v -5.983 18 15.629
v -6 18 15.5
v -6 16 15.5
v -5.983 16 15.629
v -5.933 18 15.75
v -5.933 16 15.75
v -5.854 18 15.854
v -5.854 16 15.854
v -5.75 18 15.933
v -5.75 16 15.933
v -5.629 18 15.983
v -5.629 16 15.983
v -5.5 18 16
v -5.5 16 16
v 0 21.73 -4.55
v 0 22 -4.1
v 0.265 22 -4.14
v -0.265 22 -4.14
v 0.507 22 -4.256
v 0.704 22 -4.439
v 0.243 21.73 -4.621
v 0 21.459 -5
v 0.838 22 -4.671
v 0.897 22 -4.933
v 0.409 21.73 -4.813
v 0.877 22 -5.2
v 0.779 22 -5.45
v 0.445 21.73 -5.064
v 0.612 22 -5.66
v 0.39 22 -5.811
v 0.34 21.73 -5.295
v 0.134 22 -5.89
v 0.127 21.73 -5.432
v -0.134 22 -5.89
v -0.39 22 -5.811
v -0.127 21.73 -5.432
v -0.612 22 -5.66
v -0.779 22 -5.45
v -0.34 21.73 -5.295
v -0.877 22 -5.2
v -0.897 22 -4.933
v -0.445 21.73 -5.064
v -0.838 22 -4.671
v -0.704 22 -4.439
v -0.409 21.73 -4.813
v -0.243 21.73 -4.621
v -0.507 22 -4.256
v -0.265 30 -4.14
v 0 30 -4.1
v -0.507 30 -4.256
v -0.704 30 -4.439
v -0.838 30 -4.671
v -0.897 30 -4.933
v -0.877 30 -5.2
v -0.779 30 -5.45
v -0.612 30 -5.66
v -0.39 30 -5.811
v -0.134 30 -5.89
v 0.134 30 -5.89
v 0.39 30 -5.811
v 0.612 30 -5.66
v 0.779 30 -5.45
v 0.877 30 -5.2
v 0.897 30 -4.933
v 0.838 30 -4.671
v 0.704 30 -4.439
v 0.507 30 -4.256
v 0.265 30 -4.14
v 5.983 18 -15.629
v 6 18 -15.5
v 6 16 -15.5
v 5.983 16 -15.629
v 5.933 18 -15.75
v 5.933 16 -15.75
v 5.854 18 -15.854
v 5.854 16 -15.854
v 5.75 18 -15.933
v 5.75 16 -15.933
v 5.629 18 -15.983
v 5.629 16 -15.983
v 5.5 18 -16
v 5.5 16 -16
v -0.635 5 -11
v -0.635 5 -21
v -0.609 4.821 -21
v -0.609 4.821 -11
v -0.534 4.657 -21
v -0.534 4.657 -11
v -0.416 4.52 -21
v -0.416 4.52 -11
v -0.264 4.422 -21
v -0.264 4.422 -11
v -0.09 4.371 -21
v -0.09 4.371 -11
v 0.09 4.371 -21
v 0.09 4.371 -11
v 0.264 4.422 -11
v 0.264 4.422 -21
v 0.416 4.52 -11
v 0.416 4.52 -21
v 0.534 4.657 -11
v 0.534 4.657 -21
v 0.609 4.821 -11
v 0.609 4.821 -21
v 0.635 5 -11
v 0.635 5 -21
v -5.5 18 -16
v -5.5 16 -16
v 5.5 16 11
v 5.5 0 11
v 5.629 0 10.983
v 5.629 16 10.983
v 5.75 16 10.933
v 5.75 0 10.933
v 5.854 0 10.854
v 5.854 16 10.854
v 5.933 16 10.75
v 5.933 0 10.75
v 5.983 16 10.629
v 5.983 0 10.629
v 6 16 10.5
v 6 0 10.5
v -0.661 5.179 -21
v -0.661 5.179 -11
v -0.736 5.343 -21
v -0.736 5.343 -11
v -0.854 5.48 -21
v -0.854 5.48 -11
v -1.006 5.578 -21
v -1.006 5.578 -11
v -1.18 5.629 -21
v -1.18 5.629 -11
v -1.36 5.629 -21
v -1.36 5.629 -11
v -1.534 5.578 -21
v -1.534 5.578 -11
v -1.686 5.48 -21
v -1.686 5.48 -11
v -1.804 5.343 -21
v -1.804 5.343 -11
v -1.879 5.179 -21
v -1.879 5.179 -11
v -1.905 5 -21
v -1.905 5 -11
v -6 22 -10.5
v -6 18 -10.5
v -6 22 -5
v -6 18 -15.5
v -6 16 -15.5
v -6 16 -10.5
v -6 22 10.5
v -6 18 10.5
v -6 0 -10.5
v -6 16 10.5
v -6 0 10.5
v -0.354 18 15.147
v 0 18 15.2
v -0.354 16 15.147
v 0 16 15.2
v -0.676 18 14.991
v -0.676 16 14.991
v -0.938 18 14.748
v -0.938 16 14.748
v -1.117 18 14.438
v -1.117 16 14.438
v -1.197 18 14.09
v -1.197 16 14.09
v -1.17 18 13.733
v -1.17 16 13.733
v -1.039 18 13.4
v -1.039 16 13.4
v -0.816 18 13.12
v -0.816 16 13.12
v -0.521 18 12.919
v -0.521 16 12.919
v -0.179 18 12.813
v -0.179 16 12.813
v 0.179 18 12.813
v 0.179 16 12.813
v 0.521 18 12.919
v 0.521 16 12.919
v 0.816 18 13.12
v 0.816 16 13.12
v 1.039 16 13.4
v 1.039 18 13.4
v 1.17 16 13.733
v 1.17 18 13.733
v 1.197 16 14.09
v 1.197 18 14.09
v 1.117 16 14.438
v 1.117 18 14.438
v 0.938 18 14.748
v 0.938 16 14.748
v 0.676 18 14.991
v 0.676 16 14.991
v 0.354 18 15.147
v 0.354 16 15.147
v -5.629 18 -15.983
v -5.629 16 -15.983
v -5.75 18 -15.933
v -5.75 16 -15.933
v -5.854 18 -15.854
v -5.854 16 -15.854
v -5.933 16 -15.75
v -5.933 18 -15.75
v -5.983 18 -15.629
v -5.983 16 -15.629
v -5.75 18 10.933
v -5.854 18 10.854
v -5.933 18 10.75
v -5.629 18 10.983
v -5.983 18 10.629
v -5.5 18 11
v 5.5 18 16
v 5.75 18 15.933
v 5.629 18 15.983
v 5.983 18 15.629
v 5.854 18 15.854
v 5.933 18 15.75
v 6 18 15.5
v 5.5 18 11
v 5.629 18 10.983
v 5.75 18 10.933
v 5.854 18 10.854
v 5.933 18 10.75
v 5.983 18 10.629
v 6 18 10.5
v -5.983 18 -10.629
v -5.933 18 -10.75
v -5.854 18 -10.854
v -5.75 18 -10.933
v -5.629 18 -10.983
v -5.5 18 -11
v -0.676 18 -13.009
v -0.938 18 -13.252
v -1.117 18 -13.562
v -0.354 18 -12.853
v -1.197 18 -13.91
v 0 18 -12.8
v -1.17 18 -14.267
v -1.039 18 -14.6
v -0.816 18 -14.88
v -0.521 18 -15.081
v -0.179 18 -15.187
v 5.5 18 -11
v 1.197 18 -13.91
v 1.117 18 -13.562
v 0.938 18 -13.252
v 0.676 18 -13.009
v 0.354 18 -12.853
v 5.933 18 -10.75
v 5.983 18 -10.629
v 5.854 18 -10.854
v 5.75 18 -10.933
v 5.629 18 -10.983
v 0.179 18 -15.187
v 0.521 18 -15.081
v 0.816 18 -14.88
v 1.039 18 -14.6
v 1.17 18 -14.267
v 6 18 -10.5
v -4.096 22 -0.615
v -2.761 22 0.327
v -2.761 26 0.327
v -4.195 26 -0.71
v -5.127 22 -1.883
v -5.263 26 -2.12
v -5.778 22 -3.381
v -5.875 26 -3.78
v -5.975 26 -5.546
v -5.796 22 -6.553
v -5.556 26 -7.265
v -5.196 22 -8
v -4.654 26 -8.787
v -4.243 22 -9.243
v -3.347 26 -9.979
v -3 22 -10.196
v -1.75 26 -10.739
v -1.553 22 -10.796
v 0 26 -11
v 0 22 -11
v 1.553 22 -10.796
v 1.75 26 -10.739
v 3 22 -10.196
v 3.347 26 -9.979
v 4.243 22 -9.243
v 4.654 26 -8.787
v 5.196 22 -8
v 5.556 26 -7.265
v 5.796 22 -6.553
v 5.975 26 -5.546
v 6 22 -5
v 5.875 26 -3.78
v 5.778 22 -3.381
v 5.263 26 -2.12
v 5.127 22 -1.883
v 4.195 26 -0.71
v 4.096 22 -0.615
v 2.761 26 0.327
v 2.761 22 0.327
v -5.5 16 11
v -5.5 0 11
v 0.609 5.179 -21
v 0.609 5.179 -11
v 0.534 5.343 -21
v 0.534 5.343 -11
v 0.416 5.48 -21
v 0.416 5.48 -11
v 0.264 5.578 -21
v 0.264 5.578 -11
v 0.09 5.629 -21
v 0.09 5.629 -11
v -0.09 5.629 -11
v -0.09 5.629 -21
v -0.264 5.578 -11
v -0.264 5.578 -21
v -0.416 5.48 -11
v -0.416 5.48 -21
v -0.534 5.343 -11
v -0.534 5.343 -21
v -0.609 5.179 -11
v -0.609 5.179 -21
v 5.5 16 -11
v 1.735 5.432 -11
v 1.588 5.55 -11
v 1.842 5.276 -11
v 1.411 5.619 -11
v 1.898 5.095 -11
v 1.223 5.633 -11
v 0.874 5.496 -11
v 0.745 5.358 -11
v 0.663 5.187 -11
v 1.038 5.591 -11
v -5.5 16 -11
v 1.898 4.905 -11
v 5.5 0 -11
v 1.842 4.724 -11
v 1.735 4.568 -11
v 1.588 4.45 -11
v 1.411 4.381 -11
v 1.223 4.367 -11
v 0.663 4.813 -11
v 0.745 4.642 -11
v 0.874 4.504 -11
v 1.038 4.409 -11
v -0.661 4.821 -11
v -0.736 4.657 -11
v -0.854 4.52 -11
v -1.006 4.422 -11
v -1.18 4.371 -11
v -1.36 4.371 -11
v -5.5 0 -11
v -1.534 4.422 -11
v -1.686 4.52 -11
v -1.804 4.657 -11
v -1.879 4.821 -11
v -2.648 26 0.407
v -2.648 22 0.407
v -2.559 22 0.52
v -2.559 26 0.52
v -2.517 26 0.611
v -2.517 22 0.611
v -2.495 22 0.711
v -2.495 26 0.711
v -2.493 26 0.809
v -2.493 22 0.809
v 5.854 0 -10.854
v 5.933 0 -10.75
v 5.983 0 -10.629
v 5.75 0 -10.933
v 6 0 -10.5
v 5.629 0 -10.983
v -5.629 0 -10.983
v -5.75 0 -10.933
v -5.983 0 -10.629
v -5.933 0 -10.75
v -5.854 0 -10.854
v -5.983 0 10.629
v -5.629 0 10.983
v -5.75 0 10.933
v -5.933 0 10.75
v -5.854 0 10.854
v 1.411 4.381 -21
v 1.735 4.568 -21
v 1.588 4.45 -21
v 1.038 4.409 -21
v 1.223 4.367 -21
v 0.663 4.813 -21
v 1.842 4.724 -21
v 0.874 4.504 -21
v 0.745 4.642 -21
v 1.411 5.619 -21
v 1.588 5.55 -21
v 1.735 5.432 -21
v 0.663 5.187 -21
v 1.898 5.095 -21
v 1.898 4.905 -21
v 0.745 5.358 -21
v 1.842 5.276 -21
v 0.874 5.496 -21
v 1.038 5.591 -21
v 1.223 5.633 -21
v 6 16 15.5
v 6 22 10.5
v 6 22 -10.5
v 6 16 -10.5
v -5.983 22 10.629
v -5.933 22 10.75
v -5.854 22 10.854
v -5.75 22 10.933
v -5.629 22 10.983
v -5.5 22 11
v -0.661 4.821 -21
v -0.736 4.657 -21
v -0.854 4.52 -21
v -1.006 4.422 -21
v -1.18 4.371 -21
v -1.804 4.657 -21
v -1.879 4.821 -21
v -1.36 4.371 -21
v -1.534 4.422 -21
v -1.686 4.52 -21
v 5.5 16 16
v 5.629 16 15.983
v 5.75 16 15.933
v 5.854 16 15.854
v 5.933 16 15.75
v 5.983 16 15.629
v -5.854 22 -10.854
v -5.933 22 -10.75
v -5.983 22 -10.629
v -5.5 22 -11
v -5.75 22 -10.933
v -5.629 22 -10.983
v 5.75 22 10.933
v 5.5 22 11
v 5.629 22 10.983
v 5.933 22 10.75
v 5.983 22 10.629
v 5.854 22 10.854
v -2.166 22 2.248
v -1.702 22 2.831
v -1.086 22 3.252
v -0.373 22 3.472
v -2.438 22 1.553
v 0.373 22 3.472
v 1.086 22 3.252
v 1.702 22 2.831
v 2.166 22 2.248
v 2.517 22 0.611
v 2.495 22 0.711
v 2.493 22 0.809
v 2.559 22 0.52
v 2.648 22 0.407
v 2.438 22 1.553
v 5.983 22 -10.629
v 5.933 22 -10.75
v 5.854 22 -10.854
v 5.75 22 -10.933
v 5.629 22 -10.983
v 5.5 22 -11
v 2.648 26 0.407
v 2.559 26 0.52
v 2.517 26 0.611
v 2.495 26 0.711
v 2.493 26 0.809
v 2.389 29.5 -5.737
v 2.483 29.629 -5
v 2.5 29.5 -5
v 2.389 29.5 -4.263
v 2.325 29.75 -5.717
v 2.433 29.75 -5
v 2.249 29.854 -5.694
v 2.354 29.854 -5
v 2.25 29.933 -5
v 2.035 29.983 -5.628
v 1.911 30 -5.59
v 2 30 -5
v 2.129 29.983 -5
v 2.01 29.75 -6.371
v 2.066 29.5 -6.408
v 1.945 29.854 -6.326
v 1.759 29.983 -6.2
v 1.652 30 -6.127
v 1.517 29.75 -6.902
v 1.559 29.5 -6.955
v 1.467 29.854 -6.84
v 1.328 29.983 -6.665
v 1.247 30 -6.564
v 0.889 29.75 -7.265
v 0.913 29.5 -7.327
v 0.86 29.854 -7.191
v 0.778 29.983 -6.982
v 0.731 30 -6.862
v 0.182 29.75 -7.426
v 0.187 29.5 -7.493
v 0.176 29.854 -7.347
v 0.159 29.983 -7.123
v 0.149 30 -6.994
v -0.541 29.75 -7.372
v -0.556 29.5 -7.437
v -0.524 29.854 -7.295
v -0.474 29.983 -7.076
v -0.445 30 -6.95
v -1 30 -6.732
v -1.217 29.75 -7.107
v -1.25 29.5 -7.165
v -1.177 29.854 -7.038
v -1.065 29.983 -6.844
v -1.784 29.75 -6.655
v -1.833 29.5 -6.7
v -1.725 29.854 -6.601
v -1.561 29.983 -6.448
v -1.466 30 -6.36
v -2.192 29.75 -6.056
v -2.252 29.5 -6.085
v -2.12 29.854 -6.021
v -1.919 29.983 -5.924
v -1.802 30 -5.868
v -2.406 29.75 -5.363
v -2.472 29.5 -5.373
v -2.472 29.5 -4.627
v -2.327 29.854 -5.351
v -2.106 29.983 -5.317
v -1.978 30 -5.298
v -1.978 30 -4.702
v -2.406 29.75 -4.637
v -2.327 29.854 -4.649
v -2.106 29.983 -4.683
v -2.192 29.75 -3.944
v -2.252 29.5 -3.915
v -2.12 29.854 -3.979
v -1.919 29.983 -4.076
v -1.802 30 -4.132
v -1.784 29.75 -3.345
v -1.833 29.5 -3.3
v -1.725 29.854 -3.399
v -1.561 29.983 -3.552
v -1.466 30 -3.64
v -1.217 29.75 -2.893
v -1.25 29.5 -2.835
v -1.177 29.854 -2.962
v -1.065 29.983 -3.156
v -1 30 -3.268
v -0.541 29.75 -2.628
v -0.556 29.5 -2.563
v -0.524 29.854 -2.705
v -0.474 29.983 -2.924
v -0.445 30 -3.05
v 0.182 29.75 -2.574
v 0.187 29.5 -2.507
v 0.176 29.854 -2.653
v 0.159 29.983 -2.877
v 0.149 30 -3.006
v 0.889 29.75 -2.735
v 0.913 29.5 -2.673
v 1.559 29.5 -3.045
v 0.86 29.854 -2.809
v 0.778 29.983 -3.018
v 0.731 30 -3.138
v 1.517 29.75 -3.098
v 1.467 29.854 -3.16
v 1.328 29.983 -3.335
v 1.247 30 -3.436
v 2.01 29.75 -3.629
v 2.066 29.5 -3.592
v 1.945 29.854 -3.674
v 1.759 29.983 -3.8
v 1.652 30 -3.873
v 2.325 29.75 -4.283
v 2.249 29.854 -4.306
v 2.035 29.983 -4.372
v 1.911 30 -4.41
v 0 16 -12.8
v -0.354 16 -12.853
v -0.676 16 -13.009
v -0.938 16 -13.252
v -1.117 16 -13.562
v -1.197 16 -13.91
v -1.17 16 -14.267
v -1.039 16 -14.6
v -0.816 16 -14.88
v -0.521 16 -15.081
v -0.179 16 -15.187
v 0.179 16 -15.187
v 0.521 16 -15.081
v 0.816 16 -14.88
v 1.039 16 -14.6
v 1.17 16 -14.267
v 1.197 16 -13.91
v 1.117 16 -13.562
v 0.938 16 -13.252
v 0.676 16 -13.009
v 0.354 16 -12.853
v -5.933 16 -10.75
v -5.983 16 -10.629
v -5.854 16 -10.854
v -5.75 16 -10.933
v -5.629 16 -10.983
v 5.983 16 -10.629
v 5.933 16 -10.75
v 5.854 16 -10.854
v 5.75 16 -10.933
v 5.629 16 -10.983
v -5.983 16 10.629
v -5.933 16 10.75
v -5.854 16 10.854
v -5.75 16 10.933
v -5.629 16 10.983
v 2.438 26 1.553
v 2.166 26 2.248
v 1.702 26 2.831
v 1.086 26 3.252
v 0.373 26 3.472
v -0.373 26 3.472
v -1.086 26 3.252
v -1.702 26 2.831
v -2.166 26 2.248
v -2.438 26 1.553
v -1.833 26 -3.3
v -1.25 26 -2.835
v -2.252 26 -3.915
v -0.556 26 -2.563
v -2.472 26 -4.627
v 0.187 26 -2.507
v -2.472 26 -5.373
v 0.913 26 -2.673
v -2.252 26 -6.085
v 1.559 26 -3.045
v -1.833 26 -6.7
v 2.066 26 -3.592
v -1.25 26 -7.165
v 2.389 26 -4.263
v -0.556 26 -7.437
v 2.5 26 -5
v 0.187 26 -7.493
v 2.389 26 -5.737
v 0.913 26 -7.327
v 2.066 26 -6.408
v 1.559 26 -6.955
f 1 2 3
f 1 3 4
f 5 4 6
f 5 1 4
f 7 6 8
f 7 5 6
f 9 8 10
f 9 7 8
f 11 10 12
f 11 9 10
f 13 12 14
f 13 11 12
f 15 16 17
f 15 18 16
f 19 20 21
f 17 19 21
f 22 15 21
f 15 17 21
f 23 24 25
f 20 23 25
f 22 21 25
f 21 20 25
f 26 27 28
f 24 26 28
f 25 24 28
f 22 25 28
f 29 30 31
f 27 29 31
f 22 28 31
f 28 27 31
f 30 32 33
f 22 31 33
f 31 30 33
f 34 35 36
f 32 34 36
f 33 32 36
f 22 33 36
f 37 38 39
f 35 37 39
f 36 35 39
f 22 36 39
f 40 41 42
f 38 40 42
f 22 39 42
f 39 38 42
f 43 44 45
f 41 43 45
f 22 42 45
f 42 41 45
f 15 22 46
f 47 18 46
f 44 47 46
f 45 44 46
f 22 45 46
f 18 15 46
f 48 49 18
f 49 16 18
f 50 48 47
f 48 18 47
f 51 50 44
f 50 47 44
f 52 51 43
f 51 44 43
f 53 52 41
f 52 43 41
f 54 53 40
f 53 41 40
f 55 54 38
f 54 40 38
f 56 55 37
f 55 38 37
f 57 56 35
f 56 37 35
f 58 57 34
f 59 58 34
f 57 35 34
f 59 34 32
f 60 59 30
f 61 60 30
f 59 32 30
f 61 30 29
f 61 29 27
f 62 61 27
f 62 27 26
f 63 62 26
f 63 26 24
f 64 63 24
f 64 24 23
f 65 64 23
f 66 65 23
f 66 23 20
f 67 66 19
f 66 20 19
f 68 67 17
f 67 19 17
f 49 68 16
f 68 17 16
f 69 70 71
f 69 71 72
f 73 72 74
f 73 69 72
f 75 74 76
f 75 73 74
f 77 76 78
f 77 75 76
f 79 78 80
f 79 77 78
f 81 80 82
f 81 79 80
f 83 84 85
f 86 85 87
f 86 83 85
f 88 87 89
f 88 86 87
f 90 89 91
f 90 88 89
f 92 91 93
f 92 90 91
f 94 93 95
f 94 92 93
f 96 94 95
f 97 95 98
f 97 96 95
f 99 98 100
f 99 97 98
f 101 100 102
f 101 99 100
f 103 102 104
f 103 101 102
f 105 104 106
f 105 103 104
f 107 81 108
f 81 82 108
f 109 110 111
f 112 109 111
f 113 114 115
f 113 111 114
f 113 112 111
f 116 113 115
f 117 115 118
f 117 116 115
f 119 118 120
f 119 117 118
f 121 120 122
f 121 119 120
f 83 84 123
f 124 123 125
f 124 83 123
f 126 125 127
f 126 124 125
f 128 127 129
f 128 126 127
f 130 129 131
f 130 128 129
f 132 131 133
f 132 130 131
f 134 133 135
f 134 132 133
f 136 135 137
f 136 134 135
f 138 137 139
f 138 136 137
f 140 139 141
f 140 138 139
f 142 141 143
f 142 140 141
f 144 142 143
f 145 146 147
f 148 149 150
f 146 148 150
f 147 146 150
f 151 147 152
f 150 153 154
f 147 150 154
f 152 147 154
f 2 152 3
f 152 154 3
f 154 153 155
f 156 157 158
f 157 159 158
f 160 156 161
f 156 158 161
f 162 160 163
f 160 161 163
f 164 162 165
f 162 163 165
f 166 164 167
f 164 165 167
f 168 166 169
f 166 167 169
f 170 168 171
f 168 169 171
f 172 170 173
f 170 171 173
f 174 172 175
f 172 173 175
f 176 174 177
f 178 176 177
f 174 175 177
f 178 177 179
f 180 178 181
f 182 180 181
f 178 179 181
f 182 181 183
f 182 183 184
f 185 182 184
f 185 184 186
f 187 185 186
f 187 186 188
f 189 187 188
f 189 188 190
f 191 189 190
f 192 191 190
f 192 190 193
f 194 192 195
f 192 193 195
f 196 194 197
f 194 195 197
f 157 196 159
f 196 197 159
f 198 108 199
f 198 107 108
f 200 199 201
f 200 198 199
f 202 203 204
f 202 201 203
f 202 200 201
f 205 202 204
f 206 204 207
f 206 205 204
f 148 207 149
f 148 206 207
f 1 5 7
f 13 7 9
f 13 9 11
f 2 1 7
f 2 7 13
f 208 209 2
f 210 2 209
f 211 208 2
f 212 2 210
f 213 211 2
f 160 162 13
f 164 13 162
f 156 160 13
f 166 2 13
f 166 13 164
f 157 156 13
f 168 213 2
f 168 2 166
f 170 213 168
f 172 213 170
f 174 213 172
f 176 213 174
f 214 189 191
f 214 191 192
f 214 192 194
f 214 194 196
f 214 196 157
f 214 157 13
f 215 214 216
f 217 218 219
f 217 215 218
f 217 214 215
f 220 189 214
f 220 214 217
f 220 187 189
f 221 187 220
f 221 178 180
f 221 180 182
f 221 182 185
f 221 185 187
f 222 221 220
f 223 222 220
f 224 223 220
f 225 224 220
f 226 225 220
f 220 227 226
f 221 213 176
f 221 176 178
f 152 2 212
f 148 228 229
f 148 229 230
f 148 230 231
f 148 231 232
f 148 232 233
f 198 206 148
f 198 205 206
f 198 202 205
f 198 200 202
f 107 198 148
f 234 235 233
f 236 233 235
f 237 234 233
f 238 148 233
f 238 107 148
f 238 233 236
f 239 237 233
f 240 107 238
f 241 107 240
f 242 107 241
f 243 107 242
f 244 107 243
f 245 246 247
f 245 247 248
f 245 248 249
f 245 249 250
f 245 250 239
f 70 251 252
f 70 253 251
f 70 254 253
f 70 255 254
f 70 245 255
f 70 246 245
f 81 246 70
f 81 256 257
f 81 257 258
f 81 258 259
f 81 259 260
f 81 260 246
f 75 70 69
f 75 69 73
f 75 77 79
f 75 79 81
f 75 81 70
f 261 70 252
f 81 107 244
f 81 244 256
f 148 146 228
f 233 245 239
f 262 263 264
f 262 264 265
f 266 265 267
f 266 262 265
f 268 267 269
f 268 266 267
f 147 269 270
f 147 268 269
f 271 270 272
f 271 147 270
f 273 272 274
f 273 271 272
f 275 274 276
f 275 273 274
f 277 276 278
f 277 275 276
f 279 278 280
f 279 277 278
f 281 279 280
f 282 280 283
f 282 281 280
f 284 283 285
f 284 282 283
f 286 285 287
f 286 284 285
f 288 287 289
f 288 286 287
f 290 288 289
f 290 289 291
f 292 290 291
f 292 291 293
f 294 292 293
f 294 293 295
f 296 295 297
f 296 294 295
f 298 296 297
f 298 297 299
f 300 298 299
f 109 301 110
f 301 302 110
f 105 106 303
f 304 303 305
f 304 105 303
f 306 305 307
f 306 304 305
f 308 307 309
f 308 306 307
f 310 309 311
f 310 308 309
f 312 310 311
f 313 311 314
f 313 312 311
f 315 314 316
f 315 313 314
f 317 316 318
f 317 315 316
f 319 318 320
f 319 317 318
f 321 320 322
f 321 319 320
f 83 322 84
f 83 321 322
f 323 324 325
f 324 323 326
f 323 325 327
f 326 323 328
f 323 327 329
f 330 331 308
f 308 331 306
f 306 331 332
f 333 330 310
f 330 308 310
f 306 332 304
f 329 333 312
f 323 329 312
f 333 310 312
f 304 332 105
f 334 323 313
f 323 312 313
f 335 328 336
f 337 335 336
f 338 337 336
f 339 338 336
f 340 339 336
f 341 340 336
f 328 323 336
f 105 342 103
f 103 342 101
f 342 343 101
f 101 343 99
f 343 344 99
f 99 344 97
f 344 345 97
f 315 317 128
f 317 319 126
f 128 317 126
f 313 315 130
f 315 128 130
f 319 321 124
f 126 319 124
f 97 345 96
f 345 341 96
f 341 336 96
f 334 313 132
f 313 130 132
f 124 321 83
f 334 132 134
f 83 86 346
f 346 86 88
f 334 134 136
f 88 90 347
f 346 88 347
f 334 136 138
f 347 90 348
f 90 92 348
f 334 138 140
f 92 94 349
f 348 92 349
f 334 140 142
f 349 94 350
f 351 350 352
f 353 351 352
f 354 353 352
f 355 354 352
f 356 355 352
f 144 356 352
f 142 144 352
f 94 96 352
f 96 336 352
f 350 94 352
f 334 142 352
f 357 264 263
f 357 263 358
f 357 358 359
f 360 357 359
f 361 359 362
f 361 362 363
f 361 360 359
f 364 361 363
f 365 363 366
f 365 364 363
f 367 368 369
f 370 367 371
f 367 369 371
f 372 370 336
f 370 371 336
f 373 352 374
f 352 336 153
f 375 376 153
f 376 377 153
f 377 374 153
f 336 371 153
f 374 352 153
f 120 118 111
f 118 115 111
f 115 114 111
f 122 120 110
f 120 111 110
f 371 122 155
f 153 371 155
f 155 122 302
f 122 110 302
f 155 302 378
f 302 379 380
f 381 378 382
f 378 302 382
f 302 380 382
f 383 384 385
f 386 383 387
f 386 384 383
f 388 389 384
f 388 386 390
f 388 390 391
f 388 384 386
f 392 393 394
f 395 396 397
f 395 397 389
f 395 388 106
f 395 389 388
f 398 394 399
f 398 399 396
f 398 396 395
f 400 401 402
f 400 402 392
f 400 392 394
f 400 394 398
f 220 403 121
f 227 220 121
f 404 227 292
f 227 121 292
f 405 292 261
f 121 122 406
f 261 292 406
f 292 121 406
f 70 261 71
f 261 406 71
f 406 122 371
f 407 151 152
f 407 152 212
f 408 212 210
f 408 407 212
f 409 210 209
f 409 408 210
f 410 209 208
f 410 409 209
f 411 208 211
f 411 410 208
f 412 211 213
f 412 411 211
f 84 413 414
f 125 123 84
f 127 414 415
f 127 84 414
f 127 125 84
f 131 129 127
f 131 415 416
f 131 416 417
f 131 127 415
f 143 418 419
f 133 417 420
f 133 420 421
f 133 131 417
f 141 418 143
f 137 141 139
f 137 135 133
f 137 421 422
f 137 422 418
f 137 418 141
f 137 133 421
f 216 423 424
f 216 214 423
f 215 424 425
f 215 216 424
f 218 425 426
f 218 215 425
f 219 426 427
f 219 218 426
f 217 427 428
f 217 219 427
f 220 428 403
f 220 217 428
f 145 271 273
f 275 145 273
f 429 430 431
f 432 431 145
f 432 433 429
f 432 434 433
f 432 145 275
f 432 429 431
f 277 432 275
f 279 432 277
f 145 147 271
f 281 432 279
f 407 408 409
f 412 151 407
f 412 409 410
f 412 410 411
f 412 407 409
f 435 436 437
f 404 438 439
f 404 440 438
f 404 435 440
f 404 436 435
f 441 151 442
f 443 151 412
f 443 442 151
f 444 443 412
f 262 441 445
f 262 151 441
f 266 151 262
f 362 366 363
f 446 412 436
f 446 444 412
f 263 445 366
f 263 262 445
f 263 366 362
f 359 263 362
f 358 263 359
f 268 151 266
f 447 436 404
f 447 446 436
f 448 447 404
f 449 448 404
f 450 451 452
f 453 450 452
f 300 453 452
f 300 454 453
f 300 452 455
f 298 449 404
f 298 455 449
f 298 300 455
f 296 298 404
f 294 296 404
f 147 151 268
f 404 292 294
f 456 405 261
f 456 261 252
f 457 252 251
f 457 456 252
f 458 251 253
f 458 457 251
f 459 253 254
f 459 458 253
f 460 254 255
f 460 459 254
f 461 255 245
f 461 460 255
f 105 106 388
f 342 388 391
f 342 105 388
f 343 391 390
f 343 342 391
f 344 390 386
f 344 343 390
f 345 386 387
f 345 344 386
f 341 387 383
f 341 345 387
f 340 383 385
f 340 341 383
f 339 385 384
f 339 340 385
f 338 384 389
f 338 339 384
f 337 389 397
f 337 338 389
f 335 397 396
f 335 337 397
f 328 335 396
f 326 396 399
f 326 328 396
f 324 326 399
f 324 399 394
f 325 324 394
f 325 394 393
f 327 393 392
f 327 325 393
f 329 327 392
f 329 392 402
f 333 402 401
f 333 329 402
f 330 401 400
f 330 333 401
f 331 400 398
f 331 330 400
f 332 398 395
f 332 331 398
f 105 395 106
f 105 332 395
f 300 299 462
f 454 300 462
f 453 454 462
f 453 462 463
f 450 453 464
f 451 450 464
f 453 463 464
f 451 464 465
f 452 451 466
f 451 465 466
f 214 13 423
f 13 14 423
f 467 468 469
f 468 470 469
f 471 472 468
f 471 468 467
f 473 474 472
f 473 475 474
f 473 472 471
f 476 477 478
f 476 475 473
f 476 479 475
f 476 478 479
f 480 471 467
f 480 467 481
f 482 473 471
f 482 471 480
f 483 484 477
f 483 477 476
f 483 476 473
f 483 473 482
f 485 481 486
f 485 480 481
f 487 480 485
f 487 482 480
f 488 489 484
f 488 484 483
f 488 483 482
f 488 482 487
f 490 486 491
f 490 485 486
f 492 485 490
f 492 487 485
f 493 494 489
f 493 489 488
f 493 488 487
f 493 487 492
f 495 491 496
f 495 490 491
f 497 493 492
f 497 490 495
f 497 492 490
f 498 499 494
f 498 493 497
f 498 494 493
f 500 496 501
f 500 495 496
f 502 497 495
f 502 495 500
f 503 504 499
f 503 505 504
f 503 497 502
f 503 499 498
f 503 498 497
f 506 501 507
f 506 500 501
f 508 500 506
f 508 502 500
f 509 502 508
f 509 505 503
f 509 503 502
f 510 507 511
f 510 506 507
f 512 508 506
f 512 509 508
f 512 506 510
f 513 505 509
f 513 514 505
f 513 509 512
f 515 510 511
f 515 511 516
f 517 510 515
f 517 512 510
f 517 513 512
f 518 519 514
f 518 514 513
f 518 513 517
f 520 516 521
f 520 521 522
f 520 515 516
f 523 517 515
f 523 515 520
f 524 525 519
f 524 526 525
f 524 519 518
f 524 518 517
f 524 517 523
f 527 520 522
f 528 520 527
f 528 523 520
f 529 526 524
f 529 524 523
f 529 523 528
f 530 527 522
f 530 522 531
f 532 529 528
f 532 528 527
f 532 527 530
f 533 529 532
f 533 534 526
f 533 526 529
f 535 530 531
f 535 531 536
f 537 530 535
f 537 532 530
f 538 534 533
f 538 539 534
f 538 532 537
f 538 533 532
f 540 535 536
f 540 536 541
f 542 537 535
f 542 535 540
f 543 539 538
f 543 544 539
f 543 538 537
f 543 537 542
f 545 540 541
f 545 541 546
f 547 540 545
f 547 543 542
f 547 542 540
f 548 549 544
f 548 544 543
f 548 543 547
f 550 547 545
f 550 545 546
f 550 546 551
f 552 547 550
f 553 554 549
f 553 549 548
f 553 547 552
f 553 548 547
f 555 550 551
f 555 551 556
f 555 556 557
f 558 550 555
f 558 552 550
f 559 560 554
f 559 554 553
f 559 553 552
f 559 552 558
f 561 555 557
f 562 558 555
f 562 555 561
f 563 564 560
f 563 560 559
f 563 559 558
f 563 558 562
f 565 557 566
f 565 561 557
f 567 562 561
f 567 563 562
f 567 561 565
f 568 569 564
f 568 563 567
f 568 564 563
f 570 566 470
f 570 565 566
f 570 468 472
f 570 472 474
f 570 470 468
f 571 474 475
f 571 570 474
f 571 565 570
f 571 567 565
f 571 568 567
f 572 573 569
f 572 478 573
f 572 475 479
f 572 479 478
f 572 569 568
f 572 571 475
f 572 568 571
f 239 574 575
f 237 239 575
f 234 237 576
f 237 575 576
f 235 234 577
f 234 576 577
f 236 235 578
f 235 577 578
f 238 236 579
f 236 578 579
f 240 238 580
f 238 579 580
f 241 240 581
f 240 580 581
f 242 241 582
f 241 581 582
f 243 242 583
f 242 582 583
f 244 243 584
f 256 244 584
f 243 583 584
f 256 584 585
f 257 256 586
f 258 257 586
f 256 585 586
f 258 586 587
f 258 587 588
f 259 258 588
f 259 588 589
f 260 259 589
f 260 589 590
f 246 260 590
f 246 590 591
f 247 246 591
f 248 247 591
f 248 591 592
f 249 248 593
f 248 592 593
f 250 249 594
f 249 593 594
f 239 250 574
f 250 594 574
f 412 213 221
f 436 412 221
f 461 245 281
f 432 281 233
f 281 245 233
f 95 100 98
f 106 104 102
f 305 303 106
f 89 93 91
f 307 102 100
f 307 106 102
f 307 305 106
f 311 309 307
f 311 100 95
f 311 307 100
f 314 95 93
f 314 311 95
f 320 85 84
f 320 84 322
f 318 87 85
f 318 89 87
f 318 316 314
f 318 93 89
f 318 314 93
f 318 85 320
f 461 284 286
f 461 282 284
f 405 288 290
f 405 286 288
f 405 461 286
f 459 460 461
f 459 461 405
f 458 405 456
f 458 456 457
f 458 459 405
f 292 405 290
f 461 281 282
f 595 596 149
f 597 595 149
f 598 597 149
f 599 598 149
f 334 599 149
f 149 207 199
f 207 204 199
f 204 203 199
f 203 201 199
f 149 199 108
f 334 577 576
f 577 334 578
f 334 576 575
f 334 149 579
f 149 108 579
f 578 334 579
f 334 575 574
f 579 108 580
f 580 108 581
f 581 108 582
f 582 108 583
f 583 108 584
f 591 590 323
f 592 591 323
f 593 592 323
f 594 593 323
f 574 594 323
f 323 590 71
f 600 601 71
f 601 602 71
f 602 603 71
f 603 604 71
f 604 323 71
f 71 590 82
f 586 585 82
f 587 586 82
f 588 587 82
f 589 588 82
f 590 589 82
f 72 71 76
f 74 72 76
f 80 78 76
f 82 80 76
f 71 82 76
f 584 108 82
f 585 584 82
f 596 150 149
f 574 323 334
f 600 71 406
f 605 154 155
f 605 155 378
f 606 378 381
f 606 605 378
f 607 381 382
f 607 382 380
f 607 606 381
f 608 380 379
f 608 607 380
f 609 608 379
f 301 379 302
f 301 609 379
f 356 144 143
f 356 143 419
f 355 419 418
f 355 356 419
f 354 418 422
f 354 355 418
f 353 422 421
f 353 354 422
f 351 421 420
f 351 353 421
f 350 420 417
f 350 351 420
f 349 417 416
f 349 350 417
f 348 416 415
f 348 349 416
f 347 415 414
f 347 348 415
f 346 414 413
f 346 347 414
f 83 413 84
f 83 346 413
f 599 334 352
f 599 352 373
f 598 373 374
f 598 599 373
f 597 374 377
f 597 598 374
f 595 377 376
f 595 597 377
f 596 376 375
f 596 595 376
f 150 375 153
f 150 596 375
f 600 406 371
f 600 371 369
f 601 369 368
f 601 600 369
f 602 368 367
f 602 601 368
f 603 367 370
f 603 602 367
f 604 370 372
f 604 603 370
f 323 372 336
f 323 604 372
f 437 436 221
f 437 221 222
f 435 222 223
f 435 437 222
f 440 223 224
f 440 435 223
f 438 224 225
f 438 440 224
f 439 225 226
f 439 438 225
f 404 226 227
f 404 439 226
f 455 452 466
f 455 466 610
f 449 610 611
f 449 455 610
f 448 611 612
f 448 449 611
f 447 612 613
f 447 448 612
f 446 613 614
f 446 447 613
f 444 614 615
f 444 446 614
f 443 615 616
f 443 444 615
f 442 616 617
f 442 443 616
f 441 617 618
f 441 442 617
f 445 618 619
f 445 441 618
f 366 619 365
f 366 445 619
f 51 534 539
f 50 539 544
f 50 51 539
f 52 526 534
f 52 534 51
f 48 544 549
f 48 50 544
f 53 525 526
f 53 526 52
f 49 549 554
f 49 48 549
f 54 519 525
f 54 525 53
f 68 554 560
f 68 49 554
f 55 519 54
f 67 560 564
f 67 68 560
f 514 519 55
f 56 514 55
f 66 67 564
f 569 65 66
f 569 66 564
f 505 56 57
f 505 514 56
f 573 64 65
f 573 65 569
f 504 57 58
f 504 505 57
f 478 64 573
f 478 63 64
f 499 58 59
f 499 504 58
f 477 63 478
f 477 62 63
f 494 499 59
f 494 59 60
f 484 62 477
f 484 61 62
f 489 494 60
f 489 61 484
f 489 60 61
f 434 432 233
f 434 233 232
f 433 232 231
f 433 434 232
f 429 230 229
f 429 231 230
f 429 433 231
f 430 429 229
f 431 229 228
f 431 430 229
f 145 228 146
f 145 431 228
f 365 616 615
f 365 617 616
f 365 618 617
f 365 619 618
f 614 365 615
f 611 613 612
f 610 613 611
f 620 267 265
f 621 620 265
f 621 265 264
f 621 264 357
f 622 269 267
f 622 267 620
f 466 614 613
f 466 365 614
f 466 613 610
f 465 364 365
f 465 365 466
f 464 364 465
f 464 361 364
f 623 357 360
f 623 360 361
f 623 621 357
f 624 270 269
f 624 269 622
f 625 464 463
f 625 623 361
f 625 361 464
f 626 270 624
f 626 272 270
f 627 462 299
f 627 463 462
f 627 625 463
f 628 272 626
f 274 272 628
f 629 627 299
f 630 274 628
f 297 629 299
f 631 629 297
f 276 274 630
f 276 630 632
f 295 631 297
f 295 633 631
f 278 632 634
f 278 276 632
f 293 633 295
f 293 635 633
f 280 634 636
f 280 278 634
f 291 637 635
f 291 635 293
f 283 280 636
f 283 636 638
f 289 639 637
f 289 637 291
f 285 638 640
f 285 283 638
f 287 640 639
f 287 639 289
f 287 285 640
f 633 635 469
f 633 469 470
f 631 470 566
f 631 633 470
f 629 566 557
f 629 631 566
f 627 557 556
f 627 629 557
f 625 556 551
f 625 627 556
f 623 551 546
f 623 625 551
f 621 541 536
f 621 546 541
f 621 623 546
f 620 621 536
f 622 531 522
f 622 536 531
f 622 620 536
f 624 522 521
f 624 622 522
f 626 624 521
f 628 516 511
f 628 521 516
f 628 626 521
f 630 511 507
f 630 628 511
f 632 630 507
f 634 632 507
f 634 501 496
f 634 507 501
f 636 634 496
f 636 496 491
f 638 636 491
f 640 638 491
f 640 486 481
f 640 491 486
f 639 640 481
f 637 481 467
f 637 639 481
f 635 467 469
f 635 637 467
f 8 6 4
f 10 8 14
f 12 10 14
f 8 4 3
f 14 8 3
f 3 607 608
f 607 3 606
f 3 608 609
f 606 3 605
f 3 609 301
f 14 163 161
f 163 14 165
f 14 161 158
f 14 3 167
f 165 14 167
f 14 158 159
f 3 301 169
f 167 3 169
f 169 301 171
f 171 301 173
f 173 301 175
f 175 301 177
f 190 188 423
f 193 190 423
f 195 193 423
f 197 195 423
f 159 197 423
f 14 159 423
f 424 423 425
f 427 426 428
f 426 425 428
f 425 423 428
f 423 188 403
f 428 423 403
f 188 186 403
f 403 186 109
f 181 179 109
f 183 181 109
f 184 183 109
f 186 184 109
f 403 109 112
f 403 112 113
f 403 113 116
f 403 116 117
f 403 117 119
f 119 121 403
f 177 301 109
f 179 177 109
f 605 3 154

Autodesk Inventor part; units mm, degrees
ref_plane "YZ Plane" through (0, 0, 0) normal (1, 0, 0) x (0, 1, 0)
ref_plane "XZ Plane" through (0, 0, 0) normal (0, 1, 0) x (-1, 0, 0)
ref_plane "XY Plane" through (0, 0, 0) normal (0, 0, 1) x (1, 0, 0)
sketch "Sketch1" plane through (0, 0, 0) normal (0, 1, 0) x (-1, 0, 0)
  line L0 (-6, 11) -> (-6, -11)
  line L1 (-6, -11) -> (6, -11)
  line L2 (6, -11) -> (6, 11)
  line L3 (6, 11) -> (-6, 11)
  line L4 (-6, 11) -> (6, -11) construction
  line L5 (-6, -11) -> (6, 11) construction
  point P0 (0, 0)
  dimension "d0" = 22
  dimension "d1" = 12
extrude "Extrusion1" add sketch "Sketch1" along normal blind 16
sketch "Sketch2" plane through (0, 16, 0) normal (0, 1, 0) x (1, 0, 0)
  line L0 (6, -16) -> (6, 16)
  line L1 (6, 16) -> (-6, 16)
  line L2 (-6, 16) -> (-6, -16)
  line L3 (-6, -16) -> (6, -16)
  line L4 (6, -16) -> (-6, 16) construction
  line L5 (6, 16) -> (-6, -16) construction
  point P0 (0, 0)
  dimension "d4" = 32
extrude "Extrusion2" add sketch "Sketch2" along normal blind 2
sketch "Sketch3" plane through (0, 18, 0) normal (0, 1, 0) x (1, 0, 0)
  line L0 (6, -11) -> (6, 11)
  line L1 (6, 11) -> (-6, 11)
  line L2 (-6, 11) -> (-6, -11)
  line L3 (-6, -11) -> (6, -11)
  line L4 (6, -11) -> (-6, 11) construction
  line L5 (6, 11) -> (-6, -11) construction
  point P0 (0, 0)
extrude "Extrusion3" add sketch "Sketch3" along normal blind 4
sketch "Sketch4" plane through (0, 22, 0) normal (0, 1, 0) x (1, 0, 0)
  line L0 (6, 11) -> (-6, 11) projected
  line L1 (0, 11) -> (0, 5)
  circle A0 centre (0, 5) radius 6
  line L2 (-6, -11) -> (6, -11) projected
  line L3 (0, -11) -> (0, -1)
  circle A1 centre (0, -1) radius 2.5
  point P0 (0, 0)
  dimension "d9" = 6
  dimension "d10" = 10
  dimension "d11" = 5
extrude "Extrusion4" add sketch "Sketch4" along normal blind 4
sketch "Sketch5" plane through (0, 26, 0) normal (0, 1, 0) x (1, 0, 0)
  circle A0 centre (0, 5) radius 2.5
  point P0 (0, 0)
  dimension "d14" = 5
extrude "Extrusion5" add sketch "Sketch5" along normal blind 4
sketch "Sketch6" plane through (0, 30, -5) normal (0, 1, 0) x (1, 0, 0)
  point P0 (0, -5)
  point P1 (0, 0)
hole "Hole1" at (0, 30, -5) direction (0, -1, 0) diameter 1.8 depth 8 tip angle 118 clearance for "Socket Head Cap Screw" size "M1.6" standard "Ansi Metric M Profile"
fillet "Fillet1" radius 0.5 1 edges at (-2.5, 30, -5)
fillet "Fillet2" radius 0.5 9 edges at (6, 20, 11) (6, 8, 11) (-6, 8, 11) (-6, 20, 11) (6, 20, -11) (6, 8, -11) (6, 17, 16) (-6, 17, 16) (6, 17, -16)
fillet "Fillet3" radius 0.5 2 edges at (-6, 20, -11) (-6, 8, -11)
fillet "Fillet4" radius 0.5 2 edges at (-2.4451, 24, 0.4792) (2.4451, 24, 0.4792)
sketch "Sketch7" plane through (5.5, 0, -11) normal (0, 0, -1) x (-1, 0, 0)
  line L0 (5.5, 0) -> (5.5, 5)
  circle A0 centre (5.5, 5) radius 0.635
  line L1 (5.5, 5) -> (4.23, 5)
  circle A1 centre (4.23, 5) radius 0.635
  line L2 (5.5, 5) -> (6.77, 5)
  circle A2 centre (6.77, 5) radius 0.635
  dimension "d28" = 5
  dimension "d29" = 1.27
  dimension "d30" = 1.27
  dimension "d31" = 1.27
extrude "Extrusion6" add sketch "Sketch7" along normal blind 10
fillet "Fillet5" radius 0.5 1 edges at (-6, 17, -16)
sketch "Sketch8" plane through (0, 18, 0) normal (0, 1, 0) x (1, 0, 0)
  line L0 (5.5, 16) -> (-5.5, 16) projected
  line L1 (0, 16) -> (0, 14)
  line L2 (-5.5, -16) -> (5.5, -16) projected
  line L3 (0, -16) -> (0, -14)
  point P0 (0, 0)
  dimension "d35" = 2
  dimension "d36" = 2
hole "Hole2" at (0, 18, 14) at (0, 18, -14) direction (0, -1, 0) diameter 2.4 depth 3 tip angle 118 clearance for "Socket Head Cap Screw" size "M2" standard "Ansi Metric M Profile"
properties part number "9g-micro-server"
